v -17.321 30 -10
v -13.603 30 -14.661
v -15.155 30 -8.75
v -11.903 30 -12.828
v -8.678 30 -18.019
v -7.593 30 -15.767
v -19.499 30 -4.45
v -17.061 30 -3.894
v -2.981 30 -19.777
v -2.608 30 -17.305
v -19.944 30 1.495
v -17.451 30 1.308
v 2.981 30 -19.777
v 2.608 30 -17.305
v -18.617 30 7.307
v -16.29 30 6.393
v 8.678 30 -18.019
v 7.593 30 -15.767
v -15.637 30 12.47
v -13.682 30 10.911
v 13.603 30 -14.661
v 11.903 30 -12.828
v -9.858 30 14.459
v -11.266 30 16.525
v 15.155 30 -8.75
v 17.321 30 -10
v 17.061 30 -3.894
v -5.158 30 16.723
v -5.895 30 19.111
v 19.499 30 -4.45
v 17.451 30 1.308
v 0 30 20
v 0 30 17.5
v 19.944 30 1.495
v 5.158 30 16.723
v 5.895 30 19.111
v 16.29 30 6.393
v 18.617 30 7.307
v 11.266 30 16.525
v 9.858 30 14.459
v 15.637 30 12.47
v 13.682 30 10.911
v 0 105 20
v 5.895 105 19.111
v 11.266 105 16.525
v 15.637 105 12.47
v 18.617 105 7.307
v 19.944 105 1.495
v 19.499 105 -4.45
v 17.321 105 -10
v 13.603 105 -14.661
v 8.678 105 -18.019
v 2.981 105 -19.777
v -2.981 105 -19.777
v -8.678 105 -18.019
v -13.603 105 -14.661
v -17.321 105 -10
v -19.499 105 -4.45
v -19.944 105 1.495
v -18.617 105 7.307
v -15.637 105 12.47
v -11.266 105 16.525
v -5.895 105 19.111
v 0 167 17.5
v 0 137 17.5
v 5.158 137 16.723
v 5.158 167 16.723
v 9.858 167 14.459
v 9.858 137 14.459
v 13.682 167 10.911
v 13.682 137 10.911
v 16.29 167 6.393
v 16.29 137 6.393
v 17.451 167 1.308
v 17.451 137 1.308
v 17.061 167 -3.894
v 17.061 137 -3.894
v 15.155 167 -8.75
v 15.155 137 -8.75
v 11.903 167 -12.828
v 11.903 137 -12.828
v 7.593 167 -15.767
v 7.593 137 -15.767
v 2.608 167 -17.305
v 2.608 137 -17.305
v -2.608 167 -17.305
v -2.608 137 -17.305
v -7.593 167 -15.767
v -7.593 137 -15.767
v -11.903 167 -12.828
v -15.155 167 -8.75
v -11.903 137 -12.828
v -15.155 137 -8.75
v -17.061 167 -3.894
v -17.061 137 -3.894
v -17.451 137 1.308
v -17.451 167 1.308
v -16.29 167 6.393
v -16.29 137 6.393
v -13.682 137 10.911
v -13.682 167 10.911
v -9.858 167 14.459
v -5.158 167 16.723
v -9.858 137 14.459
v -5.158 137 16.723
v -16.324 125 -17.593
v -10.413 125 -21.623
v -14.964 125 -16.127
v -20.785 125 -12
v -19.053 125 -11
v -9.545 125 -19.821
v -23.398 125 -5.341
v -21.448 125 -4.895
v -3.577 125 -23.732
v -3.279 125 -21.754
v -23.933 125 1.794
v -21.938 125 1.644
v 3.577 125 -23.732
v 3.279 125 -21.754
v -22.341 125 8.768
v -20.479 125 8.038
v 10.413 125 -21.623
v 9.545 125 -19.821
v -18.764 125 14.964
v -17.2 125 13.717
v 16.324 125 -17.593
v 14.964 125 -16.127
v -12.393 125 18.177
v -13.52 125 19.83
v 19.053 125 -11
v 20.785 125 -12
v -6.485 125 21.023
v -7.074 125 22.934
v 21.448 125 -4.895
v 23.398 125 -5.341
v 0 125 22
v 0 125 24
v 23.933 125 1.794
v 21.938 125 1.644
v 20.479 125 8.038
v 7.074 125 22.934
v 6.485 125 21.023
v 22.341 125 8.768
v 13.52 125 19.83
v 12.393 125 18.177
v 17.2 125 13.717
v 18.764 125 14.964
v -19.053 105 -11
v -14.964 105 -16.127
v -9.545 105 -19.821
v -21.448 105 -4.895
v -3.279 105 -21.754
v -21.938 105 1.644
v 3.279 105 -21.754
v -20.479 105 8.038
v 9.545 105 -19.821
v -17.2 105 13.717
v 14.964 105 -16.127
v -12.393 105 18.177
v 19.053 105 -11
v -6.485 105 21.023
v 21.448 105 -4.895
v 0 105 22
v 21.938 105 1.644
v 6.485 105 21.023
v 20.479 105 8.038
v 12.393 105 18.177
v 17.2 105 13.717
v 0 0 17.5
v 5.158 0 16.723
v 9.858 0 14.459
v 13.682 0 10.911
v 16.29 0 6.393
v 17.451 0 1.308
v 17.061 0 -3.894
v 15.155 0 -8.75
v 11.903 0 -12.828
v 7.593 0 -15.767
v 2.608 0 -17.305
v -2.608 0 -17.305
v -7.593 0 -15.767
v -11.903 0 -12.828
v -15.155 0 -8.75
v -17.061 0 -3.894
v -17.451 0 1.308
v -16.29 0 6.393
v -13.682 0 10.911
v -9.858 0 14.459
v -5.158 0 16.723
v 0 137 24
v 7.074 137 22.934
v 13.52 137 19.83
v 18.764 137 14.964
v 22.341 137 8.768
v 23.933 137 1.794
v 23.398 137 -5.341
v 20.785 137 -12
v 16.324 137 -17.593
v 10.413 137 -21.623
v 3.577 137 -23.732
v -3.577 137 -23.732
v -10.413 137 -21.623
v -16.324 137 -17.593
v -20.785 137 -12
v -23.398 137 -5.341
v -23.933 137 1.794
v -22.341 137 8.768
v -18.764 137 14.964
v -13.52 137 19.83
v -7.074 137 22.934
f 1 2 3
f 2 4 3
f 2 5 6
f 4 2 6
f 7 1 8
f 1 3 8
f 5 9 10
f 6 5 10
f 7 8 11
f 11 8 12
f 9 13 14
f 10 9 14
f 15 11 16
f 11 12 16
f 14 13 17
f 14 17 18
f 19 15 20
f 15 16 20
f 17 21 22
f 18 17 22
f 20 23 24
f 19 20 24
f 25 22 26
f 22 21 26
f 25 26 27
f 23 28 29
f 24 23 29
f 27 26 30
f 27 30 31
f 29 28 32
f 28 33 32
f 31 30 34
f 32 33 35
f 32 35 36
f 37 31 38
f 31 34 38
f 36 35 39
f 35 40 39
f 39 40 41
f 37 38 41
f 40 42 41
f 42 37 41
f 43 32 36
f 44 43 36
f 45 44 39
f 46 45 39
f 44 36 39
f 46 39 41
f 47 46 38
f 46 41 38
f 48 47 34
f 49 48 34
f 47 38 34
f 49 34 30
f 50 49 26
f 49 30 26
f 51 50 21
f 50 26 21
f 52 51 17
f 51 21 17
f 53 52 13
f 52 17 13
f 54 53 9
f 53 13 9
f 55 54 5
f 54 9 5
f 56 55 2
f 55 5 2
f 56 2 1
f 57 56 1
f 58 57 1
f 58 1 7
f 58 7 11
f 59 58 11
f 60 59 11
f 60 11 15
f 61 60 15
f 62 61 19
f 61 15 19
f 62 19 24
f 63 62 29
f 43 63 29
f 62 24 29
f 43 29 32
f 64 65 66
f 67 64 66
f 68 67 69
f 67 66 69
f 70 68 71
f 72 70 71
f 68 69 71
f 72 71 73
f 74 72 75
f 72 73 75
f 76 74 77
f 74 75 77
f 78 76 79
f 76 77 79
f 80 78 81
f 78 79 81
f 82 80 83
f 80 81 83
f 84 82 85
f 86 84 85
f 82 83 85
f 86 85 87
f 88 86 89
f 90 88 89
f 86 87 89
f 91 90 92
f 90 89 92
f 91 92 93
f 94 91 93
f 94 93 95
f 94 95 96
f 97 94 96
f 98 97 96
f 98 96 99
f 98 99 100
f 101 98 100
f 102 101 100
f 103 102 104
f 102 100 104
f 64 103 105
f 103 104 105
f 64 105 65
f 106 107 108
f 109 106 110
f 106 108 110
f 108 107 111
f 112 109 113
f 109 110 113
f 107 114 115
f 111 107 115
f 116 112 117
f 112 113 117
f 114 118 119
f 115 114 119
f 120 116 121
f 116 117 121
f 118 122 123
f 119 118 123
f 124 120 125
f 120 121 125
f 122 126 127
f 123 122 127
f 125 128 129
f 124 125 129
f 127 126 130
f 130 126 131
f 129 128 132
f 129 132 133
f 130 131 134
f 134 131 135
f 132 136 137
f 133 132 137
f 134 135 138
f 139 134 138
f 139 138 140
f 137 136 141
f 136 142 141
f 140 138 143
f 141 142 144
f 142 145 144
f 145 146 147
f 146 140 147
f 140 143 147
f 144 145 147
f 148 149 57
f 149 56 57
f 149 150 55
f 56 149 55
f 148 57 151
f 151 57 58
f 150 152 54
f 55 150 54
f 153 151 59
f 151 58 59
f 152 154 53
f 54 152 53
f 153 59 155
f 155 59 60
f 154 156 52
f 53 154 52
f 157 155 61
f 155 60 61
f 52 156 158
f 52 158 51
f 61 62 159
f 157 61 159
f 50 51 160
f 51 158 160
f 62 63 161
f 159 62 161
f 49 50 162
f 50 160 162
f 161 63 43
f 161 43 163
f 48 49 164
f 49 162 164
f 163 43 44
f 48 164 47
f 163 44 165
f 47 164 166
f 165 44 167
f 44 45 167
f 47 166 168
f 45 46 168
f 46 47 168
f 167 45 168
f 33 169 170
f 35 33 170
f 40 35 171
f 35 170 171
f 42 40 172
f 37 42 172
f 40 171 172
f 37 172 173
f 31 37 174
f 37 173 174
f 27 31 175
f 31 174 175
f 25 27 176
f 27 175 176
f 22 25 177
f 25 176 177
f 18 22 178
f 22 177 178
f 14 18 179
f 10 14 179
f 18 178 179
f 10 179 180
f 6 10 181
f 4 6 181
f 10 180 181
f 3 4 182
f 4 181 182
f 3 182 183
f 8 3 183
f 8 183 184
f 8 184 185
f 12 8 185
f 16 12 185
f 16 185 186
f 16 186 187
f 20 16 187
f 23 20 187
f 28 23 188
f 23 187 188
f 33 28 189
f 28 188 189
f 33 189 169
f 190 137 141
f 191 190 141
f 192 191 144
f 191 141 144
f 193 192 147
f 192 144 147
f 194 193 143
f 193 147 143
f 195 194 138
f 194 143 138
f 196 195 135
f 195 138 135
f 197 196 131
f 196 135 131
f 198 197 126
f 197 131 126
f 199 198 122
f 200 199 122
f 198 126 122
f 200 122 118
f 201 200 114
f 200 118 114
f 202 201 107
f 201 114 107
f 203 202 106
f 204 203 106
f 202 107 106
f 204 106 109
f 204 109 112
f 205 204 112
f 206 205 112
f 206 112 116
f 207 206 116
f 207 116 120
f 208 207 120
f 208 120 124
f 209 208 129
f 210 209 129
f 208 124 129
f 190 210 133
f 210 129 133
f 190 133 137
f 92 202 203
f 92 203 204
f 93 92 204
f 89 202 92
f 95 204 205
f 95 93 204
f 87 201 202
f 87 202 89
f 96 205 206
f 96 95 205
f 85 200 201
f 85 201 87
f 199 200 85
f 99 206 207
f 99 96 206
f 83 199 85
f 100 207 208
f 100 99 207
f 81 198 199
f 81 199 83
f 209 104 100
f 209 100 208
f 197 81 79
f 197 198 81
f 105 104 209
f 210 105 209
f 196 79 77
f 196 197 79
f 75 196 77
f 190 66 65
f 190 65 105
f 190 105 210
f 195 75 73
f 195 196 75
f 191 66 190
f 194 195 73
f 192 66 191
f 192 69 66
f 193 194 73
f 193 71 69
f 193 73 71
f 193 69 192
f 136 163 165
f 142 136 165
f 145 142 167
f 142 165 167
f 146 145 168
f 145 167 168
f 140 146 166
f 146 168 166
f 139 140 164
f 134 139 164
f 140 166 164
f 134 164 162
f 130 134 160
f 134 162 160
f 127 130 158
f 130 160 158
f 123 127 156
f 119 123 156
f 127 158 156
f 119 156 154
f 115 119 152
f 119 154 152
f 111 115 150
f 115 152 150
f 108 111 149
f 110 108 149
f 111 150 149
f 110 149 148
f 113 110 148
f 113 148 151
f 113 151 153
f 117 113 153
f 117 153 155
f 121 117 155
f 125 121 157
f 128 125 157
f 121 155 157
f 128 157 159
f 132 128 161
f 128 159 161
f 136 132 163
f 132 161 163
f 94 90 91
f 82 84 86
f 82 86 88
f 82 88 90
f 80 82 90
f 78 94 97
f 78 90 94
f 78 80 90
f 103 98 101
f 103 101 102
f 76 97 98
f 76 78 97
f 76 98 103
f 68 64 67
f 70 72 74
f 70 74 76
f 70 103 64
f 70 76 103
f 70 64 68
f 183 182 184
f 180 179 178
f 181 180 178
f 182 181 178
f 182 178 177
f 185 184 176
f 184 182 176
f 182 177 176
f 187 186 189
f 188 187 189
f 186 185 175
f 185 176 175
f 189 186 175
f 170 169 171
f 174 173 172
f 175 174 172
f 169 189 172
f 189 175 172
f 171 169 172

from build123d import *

# Parameters (mm, degrees)
SKETCH_1_R      = 17.5
EXTRUDE_1_DEPTH = 30
SKETCH_2_R      = 20
EXTRUDE_2_DEPTH = 75
SKETCH_3_R      = 22
EXTRUDE_3_DEPTH = 20
SKETCH_5_R      = 24
EXTRUDE_4_DEPTH = 12
SKETCH_6_R      = 17.5
EXTRUDE_5_DEPTH = 30


with BuildPart() as part:
    # 草图1 → 凸台-拉伸1 (new body)
    with BuildSketch(Plane(origin=(0, 0, 0), x_dir=(1, 0, 0), z_dir=(0, 1, 0))):
        with Locations(Location((0, 0, 0), (0, 0, 270))):
            Circle(SKETCH_1_R)
    extrude(amount=EXTRUDE_1_DEPTH)

    # 草图2 → 凸台-拉伸2 (add)
    with BuildSketch(Plane(origin=(0, 30, 0), x_dir=(1, 0, 0), z_dir=(0, 1, 0))):
        with Locations(Location((0, 0, 0), (0, 0, 270))):
            Circle(SKETCH_2_R)
    extrude(amount=EXTRUDE_2_DEPTH)

    # 草图3 → 凸台-拉伸3 (add)
    with BuildSketch(Plane(origin=(0, 105, 0), x_dir=(1, 0, 0), z_dir=(0, 1, 0))):
        with Locations(Location((0, 0, 0), (0, 0, 270))):
            Circle(SKETCH_3_R)
    extrude(amount=EXTRUDE_3_DEPTH)

    # 草图5 → 凸台-拉伸4 (add)
    with BuildSketch(Plane(origin=(0, 125, 0), x_dir=(1, 0, 0), z_dir=(0, 1, 0))):
        with Locations(Location((0, 0, 0), (0, 0, 270))):
            Circle(SKETCH_5_R)
    extrude(amount=EXTRUDE_4_DEPTH)

    # 草图6 → 凸台-拉伸5 (add)
    with BuildSketch(Plane(origin=(0, 137, 0), x_dir=(1, 0, 0), z_dir=(0, 1, 0))):
        with Locations(Location((0, 0, 0), (0, 0, 270))):
            Circle(SKETCH_6_R)
    extrude(amount=EXTRUDE_5_DEPTH)


solid = part.part
